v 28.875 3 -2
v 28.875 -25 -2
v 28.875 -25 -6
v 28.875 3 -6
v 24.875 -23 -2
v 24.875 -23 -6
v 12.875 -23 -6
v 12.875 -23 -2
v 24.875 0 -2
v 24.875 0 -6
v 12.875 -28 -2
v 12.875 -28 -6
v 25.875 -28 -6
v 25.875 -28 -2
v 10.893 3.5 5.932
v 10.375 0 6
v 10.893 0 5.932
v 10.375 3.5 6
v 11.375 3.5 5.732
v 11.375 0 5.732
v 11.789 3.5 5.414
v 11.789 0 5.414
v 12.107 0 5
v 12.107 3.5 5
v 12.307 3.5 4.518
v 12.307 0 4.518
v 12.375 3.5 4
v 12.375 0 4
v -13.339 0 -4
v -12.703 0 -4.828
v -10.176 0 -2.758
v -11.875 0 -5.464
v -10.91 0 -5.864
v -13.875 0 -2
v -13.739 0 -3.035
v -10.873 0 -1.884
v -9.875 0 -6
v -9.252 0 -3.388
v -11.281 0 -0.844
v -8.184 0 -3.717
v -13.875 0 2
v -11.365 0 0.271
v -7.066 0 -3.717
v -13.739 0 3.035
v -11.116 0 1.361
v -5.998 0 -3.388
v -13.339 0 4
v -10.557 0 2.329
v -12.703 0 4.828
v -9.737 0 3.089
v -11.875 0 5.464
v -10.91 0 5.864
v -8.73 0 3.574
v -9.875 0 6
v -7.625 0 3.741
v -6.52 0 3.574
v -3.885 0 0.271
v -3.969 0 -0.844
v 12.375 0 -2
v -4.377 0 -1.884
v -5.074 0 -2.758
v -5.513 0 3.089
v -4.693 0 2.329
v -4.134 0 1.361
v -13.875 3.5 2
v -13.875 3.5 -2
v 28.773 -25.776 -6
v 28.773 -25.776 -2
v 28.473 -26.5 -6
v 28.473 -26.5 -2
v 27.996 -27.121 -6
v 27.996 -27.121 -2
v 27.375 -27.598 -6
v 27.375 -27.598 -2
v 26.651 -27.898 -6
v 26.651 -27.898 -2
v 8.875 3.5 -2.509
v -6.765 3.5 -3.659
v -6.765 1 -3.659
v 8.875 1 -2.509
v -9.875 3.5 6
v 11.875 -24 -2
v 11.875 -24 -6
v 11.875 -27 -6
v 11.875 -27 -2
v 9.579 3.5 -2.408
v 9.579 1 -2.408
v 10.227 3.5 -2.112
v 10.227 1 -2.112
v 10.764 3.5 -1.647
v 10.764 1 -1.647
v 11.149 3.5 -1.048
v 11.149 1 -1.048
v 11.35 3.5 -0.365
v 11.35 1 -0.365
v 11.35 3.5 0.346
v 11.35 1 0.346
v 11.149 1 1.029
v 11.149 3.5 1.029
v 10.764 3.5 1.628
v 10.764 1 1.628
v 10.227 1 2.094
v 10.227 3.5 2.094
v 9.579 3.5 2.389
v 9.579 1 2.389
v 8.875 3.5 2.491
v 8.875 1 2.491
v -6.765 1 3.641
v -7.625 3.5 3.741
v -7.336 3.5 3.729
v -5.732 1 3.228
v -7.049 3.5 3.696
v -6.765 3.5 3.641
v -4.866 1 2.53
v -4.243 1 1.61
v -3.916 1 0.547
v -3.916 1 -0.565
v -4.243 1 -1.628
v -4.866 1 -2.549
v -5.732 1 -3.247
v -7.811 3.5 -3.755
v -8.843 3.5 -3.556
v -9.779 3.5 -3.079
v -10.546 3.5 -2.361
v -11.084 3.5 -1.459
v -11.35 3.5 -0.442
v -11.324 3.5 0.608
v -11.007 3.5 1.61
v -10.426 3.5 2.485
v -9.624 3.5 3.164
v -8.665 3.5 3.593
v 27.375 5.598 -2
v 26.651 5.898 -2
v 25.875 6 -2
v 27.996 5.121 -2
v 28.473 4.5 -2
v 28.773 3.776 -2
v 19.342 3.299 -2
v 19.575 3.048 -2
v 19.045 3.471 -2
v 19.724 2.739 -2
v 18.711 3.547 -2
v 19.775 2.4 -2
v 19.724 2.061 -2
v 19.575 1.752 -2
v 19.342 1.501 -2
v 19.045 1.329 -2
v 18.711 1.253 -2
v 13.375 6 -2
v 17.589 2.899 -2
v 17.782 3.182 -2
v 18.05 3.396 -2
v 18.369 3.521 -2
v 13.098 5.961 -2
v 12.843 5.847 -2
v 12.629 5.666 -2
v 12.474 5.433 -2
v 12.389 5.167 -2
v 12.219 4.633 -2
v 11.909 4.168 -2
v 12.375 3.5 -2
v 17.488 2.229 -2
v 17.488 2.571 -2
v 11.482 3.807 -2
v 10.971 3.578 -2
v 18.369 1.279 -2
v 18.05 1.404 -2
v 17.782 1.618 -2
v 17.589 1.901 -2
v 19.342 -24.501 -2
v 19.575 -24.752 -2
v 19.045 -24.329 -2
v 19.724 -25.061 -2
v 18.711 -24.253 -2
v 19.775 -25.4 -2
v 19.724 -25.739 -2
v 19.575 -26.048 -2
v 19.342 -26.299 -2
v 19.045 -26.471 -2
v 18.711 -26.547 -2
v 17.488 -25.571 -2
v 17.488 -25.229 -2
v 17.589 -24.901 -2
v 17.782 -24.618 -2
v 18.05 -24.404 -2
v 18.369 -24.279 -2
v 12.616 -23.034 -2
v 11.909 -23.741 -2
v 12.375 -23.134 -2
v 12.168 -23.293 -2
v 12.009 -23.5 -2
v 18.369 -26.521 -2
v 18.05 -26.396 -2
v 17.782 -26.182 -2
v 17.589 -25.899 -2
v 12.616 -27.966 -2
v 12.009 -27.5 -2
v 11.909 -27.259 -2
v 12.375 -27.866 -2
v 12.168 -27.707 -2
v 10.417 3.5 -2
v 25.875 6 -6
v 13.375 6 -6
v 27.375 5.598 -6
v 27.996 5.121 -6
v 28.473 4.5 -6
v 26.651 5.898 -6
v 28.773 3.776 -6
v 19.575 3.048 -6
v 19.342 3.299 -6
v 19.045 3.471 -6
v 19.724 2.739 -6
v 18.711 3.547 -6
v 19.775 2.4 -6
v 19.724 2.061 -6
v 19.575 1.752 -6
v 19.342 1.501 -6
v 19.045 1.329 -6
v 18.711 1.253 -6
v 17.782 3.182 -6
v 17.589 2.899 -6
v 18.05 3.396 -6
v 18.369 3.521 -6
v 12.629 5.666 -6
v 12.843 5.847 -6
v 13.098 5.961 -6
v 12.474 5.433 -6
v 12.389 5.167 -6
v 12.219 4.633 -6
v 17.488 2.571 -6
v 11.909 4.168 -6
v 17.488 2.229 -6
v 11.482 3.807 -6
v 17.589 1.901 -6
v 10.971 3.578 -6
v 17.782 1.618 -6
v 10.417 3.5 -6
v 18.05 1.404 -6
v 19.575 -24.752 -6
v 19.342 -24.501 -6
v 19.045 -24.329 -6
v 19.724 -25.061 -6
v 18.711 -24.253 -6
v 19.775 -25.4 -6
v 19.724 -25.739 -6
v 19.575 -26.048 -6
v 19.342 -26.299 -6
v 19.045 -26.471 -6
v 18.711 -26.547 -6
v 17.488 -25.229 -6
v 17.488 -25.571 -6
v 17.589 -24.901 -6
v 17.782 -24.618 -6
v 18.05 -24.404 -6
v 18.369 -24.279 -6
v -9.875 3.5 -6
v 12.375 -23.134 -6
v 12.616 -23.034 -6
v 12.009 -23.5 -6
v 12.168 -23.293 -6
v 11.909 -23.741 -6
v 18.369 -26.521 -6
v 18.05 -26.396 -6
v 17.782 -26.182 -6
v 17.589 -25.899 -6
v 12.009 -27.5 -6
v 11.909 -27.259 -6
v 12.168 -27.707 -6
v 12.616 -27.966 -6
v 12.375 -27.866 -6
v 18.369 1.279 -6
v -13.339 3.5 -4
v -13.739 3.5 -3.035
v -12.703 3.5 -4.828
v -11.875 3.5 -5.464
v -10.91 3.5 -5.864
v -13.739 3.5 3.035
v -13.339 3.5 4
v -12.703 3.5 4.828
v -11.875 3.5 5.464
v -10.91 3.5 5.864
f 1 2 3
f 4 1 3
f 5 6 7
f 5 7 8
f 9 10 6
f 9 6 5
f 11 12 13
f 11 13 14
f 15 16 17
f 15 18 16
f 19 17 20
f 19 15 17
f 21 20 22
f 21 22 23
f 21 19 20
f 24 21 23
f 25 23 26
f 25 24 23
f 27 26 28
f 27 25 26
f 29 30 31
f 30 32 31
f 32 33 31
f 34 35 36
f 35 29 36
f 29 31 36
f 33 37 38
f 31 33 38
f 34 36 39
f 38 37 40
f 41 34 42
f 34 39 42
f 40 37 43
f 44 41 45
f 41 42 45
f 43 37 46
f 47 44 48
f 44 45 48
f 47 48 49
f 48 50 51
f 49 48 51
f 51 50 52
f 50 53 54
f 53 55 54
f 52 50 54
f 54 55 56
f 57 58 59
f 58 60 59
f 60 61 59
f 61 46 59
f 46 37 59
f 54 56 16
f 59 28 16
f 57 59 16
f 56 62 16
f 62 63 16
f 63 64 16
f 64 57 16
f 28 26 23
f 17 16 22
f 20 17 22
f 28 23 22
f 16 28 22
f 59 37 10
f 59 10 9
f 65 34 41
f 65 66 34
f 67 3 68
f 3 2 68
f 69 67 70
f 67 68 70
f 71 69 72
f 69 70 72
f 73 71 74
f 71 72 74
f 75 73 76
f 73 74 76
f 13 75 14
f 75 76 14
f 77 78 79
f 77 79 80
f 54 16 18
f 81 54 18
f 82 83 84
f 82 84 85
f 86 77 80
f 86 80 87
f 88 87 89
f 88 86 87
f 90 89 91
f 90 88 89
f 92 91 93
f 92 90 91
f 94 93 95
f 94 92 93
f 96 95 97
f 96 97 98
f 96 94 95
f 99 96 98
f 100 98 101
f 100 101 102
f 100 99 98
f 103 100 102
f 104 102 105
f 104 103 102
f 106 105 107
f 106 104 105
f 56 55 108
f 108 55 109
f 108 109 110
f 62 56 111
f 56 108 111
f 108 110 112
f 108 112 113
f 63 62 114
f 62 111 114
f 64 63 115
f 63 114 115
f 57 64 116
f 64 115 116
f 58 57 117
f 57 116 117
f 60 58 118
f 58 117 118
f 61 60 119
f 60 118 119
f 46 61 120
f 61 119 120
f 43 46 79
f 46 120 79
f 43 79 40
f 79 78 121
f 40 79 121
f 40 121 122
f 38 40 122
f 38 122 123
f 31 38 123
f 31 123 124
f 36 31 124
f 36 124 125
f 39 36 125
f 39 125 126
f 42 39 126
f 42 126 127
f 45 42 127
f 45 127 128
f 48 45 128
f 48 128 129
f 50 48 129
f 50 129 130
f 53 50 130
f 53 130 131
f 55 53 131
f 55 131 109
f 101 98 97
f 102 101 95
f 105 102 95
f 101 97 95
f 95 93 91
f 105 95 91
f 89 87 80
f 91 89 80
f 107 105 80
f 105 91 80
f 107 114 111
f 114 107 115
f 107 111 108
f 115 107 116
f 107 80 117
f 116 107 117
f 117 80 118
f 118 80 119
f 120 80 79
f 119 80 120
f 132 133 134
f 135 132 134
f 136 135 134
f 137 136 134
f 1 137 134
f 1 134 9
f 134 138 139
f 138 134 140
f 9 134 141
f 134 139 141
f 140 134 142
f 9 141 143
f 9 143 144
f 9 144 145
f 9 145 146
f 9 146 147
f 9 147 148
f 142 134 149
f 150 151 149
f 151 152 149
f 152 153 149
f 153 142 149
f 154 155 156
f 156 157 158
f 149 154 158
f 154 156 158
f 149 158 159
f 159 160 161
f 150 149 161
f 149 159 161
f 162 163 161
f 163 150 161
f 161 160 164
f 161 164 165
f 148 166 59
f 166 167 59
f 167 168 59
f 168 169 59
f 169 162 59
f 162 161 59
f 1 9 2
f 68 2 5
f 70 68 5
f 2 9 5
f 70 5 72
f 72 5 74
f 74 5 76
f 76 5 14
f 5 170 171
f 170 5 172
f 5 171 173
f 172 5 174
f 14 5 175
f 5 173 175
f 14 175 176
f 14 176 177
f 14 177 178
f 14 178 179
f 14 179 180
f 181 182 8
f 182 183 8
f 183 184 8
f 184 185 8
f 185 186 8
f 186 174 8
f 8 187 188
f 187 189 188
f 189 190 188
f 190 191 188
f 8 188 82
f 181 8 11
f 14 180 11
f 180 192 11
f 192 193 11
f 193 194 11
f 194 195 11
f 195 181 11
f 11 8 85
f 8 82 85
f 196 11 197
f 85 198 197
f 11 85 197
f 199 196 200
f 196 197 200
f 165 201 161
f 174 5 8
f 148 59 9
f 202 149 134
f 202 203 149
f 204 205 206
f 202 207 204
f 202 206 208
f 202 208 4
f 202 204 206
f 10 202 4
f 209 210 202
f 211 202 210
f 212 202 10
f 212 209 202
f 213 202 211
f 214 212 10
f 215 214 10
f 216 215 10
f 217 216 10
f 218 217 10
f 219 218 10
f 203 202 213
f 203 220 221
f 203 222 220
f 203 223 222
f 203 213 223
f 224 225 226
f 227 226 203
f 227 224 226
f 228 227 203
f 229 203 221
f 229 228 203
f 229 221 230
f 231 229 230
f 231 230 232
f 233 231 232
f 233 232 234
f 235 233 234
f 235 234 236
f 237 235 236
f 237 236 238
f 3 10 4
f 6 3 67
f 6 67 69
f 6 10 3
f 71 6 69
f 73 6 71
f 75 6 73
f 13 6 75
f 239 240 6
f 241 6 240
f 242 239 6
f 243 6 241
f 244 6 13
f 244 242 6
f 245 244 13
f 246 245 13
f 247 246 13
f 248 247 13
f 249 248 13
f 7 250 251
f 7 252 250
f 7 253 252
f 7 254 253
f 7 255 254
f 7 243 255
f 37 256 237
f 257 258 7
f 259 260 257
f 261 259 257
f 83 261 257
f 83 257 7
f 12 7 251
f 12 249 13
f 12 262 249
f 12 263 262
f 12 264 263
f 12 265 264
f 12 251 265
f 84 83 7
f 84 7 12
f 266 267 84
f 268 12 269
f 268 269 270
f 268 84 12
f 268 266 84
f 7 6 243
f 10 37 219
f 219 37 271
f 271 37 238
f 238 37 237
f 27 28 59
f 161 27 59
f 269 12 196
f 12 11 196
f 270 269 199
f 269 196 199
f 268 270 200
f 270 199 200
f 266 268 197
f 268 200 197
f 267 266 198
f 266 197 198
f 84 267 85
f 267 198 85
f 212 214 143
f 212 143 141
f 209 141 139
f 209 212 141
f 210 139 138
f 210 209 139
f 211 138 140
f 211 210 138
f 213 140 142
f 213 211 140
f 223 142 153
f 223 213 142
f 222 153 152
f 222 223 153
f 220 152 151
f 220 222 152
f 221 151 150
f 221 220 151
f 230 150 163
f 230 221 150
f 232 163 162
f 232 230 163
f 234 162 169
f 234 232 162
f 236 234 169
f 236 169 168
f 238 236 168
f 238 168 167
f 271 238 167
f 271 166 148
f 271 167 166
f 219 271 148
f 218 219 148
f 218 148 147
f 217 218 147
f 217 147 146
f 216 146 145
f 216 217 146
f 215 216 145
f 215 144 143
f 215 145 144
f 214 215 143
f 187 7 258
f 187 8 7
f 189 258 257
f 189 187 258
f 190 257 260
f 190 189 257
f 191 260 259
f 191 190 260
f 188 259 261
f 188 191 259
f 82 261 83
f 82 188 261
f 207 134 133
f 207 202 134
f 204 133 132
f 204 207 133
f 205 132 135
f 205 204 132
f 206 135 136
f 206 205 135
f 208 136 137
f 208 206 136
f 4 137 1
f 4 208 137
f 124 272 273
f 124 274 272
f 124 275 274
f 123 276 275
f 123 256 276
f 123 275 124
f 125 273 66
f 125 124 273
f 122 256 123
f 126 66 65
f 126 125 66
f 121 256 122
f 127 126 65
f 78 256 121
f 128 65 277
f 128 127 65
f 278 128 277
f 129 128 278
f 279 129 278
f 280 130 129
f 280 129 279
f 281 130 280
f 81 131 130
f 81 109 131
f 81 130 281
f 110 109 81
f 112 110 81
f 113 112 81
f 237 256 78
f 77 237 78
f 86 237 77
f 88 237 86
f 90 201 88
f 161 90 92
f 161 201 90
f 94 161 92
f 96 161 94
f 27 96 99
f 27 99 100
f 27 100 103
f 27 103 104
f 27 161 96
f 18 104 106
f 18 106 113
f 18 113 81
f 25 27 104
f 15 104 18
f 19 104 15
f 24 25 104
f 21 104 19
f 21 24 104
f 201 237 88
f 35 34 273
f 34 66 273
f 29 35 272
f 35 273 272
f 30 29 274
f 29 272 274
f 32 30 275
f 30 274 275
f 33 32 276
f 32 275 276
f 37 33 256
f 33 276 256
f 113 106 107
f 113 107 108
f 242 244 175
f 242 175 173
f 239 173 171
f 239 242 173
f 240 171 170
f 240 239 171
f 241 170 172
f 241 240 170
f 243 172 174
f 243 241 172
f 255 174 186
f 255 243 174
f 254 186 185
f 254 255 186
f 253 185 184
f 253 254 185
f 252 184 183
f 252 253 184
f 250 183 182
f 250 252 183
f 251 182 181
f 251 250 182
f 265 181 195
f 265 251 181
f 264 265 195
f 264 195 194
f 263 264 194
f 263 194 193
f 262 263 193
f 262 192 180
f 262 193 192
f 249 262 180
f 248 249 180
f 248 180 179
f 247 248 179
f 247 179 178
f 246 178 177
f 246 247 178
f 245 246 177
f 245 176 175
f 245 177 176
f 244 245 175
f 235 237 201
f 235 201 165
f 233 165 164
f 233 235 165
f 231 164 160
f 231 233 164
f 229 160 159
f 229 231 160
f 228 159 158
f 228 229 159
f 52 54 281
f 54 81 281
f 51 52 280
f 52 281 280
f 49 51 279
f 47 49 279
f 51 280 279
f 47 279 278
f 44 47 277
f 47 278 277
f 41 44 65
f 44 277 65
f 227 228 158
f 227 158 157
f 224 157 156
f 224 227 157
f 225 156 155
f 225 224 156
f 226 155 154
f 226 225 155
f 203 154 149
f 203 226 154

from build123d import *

# Parameters (mm, degrees)
SKETCH1_W               = 24.75
SKETCH1_H               = 12
BOSS_EXTRUDE1_DEPTH     = 3.5
SKETCH2_R               = 3.75
CUT_EXTRUDE1_DEPTH      = 15.191216474
CUT_EXTRUDE4_DEPTH      = 2.5
SKETCH5_W               = 4
SKETCH5_H               = 3.5
BOSS_EXTRUDE2_DEPTH     = 12.5
SKETCH6_W               = 4
SKETCH6_H               = 3.5
BOSS_EXTRUDE3_DEPTH     = 4
SKETCH7_W               = 4
SKETCH7_H               = 4
BOSS_EXTRUDE4_DEPTH     = 28
SKETCH8_W               = 4
SKETCH8_H               = 5
BOSS_EXTRUDE5_DEPTH     = 13
SKETCH9_W               = 16.5
SKETCH9_H               = 4
BOSS_EXTRUDE6_DEPTH     = 2.5
CUT_EXTRUDE5_DEPTH      = 42.009335827
CUT_EXTRUDE5_DEPTH_BACK = 50
SKETCH10_R              = 1.15
FILLET4_R               = 1
SKETCH13_W              = 12
SKETCH13_H              = 3.5
BOSS_EXTRUDE7_DEPTH     = 1.5
FILLET5_R               = 4
FILLET6_R               = 4
FILLET7_R               = 2
FILLET8_R               = 3
FILLET9_R               = 2


with BuildPart() as part:
    # Sketch1 → Boss-Extrude1 (new body)
    with BuildSketch(Plane(origin=(0, 0, 0), x_dir=(1, 0, 0), z_dir=(0, 1, 0))):
        Rectangle(SKETCH1_W, SKETCH1_H)
    extrude(amount=BOSS_EXTRUDE1_DEPTH)

    # Sketch2 → Cut-Extrude1 (cut, through all)
    with BuildSketch(Plane(origin=(0, 3.5, 0), x_dir=(1, 0, 0), z_dir=(0, 1, 0))):
        with Locations(Location((-7.625, 0.009358416, 0), (0, 0, 270))):
            Circle(SKETCH2_R)
    extrude(amount=-CUT_EXTRUDE1_DEPTH, mode=Mode.SUBTRACT)

    # Sketch4 → Cut-Extrude4 (cut)
    with BuildSketch(Plane(origin=(0, 3.5, 0), x_dir=(1, 0, 0), z_dir=(0, 1, 0))):
        with BuildLine():
            Line((-6.764767473, 3.659358416), (8.875, 2.509358416))
            ThreePointArc((8.875, 2.509358416), (11.375, 0.009358416), (8.875, -2.490641584))
            Line((8.875, -2.490641584), (-6.764767473, -3.640641584))
            ThreePointArc((-6.764767473, -3.640641584), (-3.875, 0.009358416), (-6.764767473, 3.659358416))
        make_face()
    extrude(amount=-CUT_EXTRUDE4_DEPTH, mode=Mode.SUBTRACT)

    # Sketch5 → Boss-Extrude2 (add)
    with BuildSketch(Plane(origin=(12.375, 0, 0), x_dir=(0, 0, -1), z_dir=(1, 0, 0))):
        with Locations((4, 1.75)):
            Rectangle(SKETCH5_W, SKETCH5_H)
    extrude(amount=BOSS_EXTRUDE2_DEPTH)

    # Sketch6 → Boss-Extrude3 (add)
    with BuildSketch(Plane(origin=(24.875, 0, 0), x_dir=(0, 0, -1), z_dir=(1, 0, 0))):
        with Locations((4, 1.75)):
            Rectangle(SKETCH6_W, SKETCH6_H)
    extrude(amount=BOSS_EXTRUDE3_DEPTH)

    # Sketch7 → Boss-Extrude4 (add)
    with BuildSketch(Plane.XZ):
        with Locations((26.875, -4)):
            Rectangle(SKETCH7_W, SKETCH7_H)
    extrude(amount=BOSS_EXTRUDE4_DEPTH)

    # Sketch8 → Boss-Extrude5 (add)
    with BuildSketch(Plane.ZY.offset(-24.875)):
        with Locations((-4, -25.5)):
            Rectangle(SKETCH8_W, SKETCH8_H)
    extrude(amount=BOSS_EXTRUDE5_DEPTH)

    # Sketch9 → Boss-Extrude6 (add)
    with BuildSketch(Plane(origin=(0, 3.5, 0), x_dir=(1, 0, 0), z_dir=(0, 1, 0))):
        with Locations((20.625, 4)):
            Rectangle(SKETCH9_W, SKETCH9_H)
    extrude(amount=BOSS_EXTRUDE6_DEPTH)

    # Sketch10 → Cut-Extrude5 (cut, two sides: drawn at the far end of the back side and taken through both)
    with BuildSketch(Plane.XY.offset(-2).offset(-CUT_EXTRUDE5_DEPTH_BACK)):
        with Locations((18.625, 2.4)):
            Circle(SKETCH10_R)
        with Locations((18.625, -25.4)):
            Circle(SKETCH10_R)
    extrude(amount=CUT_EXTRUDE5_DEPTH + CUT_EXTRUDE5_DEPTH_BACK, mode=Mode.SUBTRACT)

    # Fillet4
    fillet4_edges = [part.edges().sort_by_distance(p)[0] for p in [
        (11.875, -28, -4),
        (11.875, -23, -4),
        (12.375, 6, -4),
    ]]
    fillet(fillet4_edges, radius=FILLET4_R)

    # Sketch13 → Boss-Extrude7 (add)
    with BuildSketch(Plane.ZY.offset(12.375)):
        with Locations((0, 1.75)):
            Rectangle(SKETCH13_W, SKETCH13_H)
    extrude(amount=BOSS_EXTRUDE7_DEPTH)

    # Fillet5
    fillet5_edges = [part.edges().sort_by_distance(p)[0] for p in [
        (-13.875, 1.75, 6),
    ]]
    fillet(fillet5_edges, radius=FILLET5_R)

    # Fillet6
    fillet6_edges = [part.edges().sort_by_distance(p)[0] for p in [
        (-13.875, 1.75, -6),
    ]]
    fillet(fillet6_edges, radius=FILLET6_R)

    # Fillet7
    fillet7_edges = [part.edges().sort_by_distance(p)[0] for p in [
        (12.375, 1.75, 6),
    ]]
    fillet(fillet7_edges, radius=FILLET7_R)

    # Fillet8
    fillet8_edges = [part.edges().sort_by_distance(p)[0] for p in [
        (28.875, -28, -4),
        (28.875, 6, -4),
    ]]
    fillet(fillet8_edges, radius=FILLET8_R)

    # Fillet9
    # the kernel refuses this fillet: 2 mm, written as the material it adds along each edge
    with BuildSketch(Plane(origin=(12.375, 3.5, -6), x_dir=(0.008391726197268362, 0.9999647888458023, 0), z_dir=(0, 0, 1))) as fillet9_piece_1:
        with BuildLine():
            CenterArc((1.983498243, 1.974754399), FILLET9_R, 180.480816137, 80.405931773)
            Line((-0.016431335, 1.957970947), (-0.216424292, 1.956292601))
            Line((-0.216424292, 1.956292601), (-0.199992958, -0.001678345))
            Line((-0.199992958, -0.001678345), (0.001678345, -0.199992958))
            ThreePointArc((0.001678345, -0.199992958), (1.501625529, -0.187405368), (1.635048065, -0.19747544))
            Line((1.635048065, -0.19747544), (1.666725354, 0))
        make_face()
    extrude(amount=4)


solid = part.part
